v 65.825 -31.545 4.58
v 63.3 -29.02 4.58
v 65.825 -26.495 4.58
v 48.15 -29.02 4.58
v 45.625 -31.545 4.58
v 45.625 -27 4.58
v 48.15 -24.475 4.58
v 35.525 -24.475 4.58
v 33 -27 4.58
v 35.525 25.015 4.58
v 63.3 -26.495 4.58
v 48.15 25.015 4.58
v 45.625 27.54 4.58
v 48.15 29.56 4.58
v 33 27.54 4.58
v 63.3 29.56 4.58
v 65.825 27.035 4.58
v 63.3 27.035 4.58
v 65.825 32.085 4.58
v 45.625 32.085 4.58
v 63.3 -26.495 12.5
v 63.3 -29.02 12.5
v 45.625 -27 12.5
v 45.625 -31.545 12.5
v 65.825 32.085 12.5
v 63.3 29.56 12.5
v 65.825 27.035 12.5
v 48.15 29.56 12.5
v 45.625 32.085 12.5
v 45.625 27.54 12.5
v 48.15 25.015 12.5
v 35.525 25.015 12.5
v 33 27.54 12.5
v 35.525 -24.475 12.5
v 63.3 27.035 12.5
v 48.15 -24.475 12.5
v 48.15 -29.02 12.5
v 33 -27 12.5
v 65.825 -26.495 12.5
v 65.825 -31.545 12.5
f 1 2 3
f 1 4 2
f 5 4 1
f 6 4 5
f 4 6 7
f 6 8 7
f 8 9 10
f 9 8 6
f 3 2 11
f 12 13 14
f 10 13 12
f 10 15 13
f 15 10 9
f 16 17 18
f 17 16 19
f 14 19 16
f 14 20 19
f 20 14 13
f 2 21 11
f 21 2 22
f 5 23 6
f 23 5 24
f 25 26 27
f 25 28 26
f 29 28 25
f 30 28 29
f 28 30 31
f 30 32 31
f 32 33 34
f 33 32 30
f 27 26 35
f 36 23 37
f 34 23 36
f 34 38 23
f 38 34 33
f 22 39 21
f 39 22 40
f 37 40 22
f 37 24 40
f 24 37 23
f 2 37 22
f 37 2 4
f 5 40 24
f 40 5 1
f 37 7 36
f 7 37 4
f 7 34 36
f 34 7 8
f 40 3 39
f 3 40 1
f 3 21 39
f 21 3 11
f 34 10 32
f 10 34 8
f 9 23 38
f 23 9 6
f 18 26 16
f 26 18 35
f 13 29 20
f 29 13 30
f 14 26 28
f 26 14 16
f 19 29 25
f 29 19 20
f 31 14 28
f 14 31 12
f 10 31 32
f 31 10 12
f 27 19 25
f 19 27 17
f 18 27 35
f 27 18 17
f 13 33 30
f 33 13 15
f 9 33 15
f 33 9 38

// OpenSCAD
$fn=150;

BRETT_THICKNESS = 10;
BRETT_WIDTH = 49;
module brett() {
  translate([0, -BRETT_WIDTH/2, 0]) cube([300, BRETT_WIDTH, BRETT_THICKNESS]); // Wiege Brett
}

RING_THICKNESS = 2.5;
RING_OUTER = 58;
module adapter() {
  module adapter_notch() {
    CLIP_BASE_WIDTH = 15;
    CLIP_BASE_THICKNESS = RING_THICKNESS*2;
    CLIP_BASE_HEIGHT = 5;
    translate([-CLIP_BASE_WIDTH/2, -RING_OUTER/2-CLIP_BASE_HEIGHT/2, -CLIP_BASE_THICKNESS/2])
      cube([CLIP_BASE_WIDTH, CLIP_BASE_HEIGHT, CLIP_BASE_THICKNESS]);
  }
  YICAM_SPACE = 12.5;
  translate([0, 0, -YICAM_SPACE]) //Platz zwischen Adapter und Brett für yicam Gehäuse
    translate([RING_OUTER/2, 0, -2.5]) {

      difference() {
        cylinder(h=RING_THICKNESS, d=RING_OUTER);
        translate([0, 0, -RING_THICKNESS]) cylinder(h=7.5, d=46);
      }

mirror([0, 1, 0]) adapter_notch();
adapter_notch();
    }
}

CLIP_THICKNESS = 2.5;
CLIP_WIDTH = 8;
module clip() {
  module hook() {
    cube([CLIP_WIDTH, CLIP_THICKNESS, BRETT_THICKNESS]);
    translate([0, -(RING_OUTER/2-BRETT_WIDTH/2), 0]) {
      translate([0, 0, BRETT_THICKNESS]) cube([CLIP_WIDTH, CLIP_THICKNESS, CLIP_SPACE+RING_THICKNESS*2]);
      translate([0, CLIP_THICKNESS, BRETT_THICKNESS]) cube([CLIP_WIDTH, RING_OUTER/2-BRETT_WIDTH/2, CLIP_THICKNESS]);
      translate([0, 0, CLIP_SPACE+BRETT_THICKNESS+RING_THICKNESS*2]) cube([CLIP_WIDTH, CLIP_THICKNESS*2, CLIP_THICKNESS]);
    }
  }
  CLIP_HEIGHT = BRETT_WIDTH+2*CLIP_THICKNESS;
  CLIP_SPACE = 12.5;
  cube([CLIP_WIDTH, CLIP_HEIGHT, CLIP_THICKNESS]);
  translate([0, 0, CLIP_THICKNESS]) {
    translate([0, CLIP_HEIGHT, 0]) mirror([0, 1, 0]) hook();
    hook();
  }
}

translate([RING_OUTER/2+CLIP_WIDTH/2, -BRETT_WIDTH/2-CLIP_THICKNESS, BRETT_THICKNESS+CLIP_THICKNESS]) rotate([0, 90, 0]) scale([0.99, 1.01, 1.01]) clip();

//brett();

/**
difference() {
adapter();
scale([1.01, 1.01, 1.01]) translate([RING_OUTER/2+CLIP_WIDTH/2, -BRETT_WIDTH/2-CLIP_THICKNESS, BRETT_THICKNESS+CLIP_THICKNESS]) rotate([0, 180, 0]) clip();
translate([RING_OUTER/2+CLIP_WIDTH/2, -BRETT_WIDTH/2-CLIP_THICKNESS, BRETT_THICKNESS+CLIP_THICKNESS]) rotate([0, 180, 0]) clip();
}
**/
